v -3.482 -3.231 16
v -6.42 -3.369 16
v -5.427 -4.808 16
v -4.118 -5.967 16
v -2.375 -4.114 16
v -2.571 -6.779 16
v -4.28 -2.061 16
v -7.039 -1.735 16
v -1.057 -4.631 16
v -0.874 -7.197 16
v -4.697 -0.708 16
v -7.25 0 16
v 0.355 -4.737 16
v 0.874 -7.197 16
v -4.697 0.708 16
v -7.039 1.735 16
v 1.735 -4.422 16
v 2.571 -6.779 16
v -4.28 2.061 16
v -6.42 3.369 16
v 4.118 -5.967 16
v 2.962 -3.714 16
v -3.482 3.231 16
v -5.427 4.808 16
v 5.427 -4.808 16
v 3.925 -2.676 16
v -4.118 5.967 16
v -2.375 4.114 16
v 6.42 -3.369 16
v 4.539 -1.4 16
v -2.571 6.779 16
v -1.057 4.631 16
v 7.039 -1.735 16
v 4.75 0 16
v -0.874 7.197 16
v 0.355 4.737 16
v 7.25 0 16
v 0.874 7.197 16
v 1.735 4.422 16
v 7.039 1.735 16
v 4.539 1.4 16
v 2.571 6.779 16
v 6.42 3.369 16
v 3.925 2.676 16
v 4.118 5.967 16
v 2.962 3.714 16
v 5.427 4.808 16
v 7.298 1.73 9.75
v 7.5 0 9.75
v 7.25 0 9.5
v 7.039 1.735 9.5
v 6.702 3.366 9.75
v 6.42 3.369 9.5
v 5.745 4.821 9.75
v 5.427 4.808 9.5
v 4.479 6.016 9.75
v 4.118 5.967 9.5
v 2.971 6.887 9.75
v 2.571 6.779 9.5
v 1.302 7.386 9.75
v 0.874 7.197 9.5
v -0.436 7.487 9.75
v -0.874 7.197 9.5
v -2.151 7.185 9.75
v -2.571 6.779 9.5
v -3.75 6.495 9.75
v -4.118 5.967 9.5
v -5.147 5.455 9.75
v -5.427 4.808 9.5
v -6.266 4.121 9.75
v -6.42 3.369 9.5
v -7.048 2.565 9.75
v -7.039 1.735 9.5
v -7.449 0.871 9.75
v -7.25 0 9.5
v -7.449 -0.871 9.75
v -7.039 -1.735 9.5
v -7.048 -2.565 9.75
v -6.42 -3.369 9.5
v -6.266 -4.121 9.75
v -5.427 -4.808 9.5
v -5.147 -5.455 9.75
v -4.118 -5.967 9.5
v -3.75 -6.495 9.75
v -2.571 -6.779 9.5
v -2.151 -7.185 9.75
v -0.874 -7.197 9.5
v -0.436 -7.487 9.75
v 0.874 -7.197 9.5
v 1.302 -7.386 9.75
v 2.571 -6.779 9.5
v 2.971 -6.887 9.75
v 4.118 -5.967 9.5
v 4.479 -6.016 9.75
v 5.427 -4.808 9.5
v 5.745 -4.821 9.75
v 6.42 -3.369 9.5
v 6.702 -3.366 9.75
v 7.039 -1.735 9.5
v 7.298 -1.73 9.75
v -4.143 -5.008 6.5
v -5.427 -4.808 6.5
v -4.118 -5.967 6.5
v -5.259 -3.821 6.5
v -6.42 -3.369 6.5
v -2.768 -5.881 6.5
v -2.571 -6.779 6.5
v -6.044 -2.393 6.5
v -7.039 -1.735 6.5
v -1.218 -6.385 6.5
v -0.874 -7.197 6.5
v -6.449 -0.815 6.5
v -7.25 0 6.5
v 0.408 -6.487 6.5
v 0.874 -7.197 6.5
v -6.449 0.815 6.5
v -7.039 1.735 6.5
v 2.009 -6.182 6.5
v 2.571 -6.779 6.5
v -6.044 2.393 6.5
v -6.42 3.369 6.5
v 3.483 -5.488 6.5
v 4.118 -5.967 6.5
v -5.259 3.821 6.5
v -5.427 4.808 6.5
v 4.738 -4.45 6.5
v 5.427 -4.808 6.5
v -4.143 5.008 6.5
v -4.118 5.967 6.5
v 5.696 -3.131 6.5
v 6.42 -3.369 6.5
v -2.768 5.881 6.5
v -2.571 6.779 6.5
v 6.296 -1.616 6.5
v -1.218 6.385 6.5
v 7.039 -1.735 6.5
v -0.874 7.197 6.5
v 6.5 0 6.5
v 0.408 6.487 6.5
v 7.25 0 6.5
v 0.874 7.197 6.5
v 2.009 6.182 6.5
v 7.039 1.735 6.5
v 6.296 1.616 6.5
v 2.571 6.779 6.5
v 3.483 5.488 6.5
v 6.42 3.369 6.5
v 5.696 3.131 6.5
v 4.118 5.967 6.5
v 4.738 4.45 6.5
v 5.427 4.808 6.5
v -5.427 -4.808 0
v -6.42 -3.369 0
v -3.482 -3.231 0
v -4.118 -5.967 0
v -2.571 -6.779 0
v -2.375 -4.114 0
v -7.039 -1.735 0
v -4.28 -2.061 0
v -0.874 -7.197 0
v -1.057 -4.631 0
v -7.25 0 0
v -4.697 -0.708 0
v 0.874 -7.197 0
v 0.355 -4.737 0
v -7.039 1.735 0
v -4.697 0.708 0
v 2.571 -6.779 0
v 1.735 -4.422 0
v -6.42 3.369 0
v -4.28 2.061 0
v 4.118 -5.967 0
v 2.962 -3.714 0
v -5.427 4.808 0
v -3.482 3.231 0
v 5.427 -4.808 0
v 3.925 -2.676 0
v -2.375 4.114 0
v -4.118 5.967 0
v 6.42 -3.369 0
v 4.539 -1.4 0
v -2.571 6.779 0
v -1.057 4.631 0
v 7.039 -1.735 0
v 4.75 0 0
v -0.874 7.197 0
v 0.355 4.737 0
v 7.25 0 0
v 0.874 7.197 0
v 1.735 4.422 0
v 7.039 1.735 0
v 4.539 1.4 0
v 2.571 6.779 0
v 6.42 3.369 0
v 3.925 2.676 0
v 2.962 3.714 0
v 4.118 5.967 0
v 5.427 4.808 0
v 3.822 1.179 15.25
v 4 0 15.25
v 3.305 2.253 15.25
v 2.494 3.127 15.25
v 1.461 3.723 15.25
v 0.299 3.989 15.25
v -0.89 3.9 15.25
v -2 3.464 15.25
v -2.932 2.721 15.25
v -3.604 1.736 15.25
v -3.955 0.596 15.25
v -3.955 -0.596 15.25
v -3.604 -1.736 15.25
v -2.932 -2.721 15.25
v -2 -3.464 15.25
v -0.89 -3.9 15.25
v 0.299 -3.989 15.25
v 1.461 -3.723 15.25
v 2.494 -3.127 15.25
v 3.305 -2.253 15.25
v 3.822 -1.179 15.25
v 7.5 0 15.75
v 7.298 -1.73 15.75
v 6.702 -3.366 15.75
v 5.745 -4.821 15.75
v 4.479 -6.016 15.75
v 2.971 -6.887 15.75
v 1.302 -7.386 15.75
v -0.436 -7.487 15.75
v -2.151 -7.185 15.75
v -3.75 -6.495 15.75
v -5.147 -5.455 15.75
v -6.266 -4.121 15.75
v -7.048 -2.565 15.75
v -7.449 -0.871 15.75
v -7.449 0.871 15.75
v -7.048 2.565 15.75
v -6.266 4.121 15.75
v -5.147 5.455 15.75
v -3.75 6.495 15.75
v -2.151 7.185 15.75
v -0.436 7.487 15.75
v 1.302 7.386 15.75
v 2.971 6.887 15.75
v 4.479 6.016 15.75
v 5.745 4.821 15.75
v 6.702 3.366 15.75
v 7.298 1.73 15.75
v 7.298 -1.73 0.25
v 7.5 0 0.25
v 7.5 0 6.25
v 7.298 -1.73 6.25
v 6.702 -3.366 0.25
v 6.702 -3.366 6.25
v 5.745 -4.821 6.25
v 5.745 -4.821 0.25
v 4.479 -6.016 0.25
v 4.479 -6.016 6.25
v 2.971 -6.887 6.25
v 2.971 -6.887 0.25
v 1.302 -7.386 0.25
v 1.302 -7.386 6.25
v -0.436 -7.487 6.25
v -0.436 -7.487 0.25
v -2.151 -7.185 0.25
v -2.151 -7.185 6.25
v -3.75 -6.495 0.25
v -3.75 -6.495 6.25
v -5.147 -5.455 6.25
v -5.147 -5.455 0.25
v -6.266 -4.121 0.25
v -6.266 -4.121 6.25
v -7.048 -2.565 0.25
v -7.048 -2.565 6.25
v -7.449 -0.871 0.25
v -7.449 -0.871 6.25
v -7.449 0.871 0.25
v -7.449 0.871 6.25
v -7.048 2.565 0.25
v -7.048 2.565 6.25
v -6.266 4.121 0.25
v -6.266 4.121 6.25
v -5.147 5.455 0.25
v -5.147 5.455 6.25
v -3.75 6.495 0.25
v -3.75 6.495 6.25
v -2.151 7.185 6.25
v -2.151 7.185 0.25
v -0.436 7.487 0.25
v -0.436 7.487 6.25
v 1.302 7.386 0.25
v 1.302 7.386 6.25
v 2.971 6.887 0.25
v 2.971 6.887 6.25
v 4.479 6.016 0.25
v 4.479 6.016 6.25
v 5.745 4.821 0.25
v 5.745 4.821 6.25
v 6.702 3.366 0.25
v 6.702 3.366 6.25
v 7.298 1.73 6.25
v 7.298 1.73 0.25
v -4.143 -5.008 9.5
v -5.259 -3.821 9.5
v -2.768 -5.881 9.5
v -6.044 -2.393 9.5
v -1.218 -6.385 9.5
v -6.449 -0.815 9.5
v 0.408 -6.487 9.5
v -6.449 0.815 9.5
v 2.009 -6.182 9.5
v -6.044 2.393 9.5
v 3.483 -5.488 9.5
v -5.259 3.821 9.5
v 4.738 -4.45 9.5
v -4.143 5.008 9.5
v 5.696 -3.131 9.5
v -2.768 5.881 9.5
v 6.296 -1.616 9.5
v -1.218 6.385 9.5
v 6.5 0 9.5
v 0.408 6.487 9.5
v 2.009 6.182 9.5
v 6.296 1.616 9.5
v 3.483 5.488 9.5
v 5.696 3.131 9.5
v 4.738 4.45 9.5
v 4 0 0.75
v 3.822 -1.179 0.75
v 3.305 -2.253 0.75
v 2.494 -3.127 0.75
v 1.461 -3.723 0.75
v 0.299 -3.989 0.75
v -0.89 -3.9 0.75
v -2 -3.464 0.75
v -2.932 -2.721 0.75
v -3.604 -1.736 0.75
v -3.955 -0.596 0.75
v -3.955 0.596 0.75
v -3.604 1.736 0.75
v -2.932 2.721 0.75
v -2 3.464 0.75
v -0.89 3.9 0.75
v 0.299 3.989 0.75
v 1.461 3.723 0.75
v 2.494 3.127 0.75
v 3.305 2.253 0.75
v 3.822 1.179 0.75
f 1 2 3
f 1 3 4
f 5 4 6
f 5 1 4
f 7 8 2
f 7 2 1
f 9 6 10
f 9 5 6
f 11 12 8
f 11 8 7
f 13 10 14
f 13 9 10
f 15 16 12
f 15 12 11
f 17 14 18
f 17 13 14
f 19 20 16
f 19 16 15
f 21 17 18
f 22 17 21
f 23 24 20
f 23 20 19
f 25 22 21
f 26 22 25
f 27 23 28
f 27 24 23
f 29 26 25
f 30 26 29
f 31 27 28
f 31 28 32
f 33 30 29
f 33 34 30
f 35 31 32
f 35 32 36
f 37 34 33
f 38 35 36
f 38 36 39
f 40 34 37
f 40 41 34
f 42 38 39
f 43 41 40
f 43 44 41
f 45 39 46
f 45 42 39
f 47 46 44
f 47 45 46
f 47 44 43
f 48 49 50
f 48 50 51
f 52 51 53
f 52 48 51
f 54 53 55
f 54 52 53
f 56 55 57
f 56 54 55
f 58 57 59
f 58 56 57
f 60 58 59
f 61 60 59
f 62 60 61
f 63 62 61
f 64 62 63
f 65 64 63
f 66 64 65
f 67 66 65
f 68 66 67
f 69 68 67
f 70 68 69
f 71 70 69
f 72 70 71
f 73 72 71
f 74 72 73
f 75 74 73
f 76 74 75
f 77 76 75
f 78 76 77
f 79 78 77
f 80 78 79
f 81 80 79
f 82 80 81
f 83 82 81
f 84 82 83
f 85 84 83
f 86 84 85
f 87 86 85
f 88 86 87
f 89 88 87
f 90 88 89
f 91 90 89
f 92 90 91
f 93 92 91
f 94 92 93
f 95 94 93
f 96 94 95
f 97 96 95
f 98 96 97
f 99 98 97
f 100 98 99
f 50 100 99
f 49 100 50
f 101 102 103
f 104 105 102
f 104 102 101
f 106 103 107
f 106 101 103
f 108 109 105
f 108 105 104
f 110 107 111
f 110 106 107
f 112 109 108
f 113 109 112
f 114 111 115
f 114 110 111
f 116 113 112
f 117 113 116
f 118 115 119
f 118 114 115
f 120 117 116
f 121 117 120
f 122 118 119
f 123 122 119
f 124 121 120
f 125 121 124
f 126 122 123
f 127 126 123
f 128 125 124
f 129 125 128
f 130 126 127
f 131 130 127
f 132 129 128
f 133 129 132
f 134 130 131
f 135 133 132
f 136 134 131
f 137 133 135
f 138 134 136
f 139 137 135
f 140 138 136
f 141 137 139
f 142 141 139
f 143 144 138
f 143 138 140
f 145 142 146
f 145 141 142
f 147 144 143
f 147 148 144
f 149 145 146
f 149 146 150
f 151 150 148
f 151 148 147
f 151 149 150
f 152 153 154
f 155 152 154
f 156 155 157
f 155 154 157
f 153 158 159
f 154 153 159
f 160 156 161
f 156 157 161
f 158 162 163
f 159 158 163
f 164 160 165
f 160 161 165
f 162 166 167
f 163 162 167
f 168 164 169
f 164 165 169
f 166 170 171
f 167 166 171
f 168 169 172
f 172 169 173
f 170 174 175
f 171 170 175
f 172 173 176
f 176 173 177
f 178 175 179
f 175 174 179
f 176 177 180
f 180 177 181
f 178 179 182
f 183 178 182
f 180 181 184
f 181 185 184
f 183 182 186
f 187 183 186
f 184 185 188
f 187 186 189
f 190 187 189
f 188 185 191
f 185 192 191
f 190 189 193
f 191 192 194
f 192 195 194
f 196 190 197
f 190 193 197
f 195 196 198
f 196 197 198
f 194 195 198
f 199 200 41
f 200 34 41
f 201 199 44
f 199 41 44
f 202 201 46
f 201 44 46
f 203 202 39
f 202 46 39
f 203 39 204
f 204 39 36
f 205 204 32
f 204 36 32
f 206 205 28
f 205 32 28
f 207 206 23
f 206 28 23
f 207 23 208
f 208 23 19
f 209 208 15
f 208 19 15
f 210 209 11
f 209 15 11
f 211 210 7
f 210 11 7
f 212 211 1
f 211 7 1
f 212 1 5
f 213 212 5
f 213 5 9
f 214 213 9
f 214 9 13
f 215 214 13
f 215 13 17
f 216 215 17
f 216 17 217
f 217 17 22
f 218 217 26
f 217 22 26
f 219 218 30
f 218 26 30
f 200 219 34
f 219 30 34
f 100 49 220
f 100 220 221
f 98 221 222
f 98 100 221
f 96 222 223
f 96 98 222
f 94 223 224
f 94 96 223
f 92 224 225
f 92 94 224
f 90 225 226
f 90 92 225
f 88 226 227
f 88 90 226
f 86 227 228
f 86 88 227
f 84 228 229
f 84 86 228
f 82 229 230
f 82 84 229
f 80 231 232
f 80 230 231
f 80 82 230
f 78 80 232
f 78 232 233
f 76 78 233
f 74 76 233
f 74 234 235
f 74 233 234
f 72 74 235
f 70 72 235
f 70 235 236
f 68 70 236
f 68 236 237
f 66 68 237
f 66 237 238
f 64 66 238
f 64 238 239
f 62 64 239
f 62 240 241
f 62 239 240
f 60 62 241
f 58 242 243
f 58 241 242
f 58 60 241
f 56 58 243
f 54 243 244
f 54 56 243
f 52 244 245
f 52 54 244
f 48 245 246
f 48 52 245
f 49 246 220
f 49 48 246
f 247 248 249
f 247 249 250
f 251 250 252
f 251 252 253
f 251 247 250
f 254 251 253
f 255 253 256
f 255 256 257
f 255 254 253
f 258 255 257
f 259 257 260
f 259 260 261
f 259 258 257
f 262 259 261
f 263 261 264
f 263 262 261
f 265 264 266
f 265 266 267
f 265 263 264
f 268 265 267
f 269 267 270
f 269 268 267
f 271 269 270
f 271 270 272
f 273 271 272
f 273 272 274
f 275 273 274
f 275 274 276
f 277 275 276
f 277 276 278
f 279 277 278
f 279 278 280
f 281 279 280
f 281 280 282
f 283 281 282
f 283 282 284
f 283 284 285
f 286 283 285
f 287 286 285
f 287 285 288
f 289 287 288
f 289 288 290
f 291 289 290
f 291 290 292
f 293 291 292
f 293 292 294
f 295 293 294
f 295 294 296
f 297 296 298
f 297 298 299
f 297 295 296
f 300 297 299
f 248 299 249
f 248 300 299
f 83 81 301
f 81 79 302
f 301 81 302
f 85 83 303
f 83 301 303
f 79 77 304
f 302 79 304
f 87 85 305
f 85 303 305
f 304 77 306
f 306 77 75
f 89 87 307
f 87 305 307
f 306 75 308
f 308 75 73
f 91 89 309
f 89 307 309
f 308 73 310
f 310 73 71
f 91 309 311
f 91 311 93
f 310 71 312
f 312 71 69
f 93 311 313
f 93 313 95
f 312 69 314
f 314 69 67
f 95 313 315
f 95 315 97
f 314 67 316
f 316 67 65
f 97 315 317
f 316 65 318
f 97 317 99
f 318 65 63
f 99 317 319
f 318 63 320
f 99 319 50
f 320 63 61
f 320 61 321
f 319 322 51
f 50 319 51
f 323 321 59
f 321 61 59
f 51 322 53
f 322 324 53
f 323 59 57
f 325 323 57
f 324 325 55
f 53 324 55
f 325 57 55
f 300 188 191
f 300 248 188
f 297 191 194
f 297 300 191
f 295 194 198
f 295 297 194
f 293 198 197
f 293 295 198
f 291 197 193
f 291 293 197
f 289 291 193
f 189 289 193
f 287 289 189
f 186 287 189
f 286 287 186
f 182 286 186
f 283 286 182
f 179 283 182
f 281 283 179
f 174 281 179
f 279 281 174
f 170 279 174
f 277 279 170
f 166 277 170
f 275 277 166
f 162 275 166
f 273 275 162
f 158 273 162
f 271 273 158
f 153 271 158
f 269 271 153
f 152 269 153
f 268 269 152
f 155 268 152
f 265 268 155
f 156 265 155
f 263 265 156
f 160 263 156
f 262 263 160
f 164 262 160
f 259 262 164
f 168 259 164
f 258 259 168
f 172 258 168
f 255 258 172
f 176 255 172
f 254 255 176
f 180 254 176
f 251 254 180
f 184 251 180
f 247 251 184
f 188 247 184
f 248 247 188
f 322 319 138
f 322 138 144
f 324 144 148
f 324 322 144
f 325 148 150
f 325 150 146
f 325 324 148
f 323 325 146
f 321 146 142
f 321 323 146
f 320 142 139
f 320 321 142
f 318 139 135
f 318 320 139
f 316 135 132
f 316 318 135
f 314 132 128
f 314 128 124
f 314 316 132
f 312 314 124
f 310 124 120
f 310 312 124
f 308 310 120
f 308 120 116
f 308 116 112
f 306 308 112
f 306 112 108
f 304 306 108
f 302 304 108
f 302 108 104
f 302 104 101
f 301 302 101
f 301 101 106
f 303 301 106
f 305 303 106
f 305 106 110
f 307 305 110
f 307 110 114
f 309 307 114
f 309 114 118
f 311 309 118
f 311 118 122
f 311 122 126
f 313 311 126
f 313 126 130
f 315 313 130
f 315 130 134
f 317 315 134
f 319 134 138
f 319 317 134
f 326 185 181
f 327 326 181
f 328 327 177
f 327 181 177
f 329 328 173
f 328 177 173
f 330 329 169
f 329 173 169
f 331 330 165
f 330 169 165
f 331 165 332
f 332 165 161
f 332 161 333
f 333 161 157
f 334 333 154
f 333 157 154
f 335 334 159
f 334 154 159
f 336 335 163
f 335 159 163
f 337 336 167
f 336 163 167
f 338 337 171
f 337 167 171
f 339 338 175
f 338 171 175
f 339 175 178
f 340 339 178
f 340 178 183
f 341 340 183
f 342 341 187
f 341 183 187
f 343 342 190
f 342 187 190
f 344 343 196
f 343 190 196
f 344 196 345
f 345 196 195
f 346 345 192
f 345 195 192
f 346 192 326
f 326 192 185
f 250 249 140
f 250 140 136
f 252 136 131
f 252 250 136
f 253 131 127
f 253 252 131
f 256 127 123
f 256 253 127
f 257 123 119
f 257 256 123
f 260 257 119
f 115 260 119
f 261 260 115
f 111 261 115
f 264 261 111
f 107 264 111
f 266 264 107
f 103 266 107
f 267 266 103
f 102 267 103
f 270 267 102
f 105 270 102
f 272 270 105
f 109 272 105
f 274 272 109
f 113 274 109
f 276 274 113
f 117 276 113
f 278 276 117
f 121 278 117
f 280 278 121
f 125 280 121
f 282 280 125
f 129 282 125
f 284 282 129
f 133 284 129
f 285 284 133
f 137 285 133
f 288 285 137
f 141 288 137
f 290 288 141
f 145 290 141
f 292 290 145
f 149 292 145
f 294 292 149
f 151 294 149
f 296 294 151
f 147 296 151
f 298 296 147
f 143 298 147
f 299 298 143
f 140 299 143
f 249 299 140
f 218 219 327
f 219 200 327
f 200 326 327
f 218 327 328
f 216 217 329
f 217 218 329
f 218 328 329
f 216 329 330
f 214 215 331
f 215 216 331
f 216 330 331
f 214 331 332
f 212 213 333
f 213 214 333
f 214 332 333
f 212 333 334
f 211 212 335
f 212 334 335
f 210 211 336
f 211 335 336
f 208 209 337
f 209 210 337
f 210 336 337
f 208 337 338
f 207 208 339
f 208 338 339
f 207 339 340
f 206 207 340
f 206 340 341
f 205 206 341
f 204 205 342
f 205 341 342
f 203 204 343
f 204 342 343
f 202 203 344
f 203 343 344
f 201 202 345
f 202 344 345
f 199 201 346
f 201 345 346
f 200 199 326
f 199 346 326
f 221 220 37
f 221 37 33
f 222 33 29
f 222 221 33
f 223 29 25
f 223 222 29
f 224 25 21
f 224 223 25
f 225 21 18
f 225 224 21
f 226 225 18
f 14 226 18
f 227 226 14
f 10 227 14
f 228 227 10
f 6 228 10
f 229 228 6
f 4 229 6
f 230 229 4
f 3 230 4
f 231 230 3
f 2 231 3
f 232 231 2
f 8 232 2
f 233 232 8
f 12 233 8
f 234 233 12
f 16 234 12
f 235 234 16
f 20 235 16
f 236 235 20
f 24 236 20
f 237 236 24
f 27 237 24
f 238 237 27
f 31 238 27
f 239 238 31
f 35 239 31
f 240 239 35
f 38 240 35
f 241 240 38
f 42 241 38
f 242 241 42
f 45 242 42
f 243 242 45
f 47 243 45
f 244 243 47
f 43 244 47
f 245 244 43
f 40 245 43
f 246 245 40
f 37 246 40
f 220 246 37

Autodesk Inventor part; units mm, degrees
ref_plane "YZ Plane" through (0, 0, 0) normal (1, 0, 0) x (0, 1, 0)
ref_plane "XZ Plane" through (0, 0, 0) normal (0, 1, 0) x (-1, 0, 0)
sketch "Sketch2" plane through (0, 0, 0) normal (0, 0, 1) x (1, 0, 0)
  circle A0 centre (0, 0) radius 4
  circle A1 centre (0, 0) radius 7.5
  dimension "d0" = 8
  dimension "d1" = 15
extrude "Extrusion1" add sketch "Sketch2" along normal blind 16
ref_plane "Work Plane1" through (0, 0, 8) normal (0, 0, 1) x (1, 0, 0)
sketch "Sketch3" plane through (0, 0, 8) normal (0, 0, 1) x (1, 0, 0)
  circle A0 centre (0, 0) radius 6.5
  circle A1 centre (0, 0) radius 8
  circle A2 centre (0, 0) radius 4
  dimension "d4" = 13
  dimension "d5" = 16
  dimension "d6" = 8
extrude "Extrusion2" cut sketch "Sketch3" along normal mid plane 3 contours A1
chamfer "Chamfer1" distance 0.25 angle 45 2 edges at (-7.5, 0, 16) (-7.5, 0, 0)
chamfer "Chamfer2" distance 0.75 angle 45 2 edges at (-4, 0, 16) (-4, 0, 0)
chamfer "Chamfer3" distance 0.25 angle 45 2 edges at (-7.5, 0, 9.5) (-7.5, 0, 6.5)
properties part number "Striped Bushing" material "Brass, Soft Yellow"
